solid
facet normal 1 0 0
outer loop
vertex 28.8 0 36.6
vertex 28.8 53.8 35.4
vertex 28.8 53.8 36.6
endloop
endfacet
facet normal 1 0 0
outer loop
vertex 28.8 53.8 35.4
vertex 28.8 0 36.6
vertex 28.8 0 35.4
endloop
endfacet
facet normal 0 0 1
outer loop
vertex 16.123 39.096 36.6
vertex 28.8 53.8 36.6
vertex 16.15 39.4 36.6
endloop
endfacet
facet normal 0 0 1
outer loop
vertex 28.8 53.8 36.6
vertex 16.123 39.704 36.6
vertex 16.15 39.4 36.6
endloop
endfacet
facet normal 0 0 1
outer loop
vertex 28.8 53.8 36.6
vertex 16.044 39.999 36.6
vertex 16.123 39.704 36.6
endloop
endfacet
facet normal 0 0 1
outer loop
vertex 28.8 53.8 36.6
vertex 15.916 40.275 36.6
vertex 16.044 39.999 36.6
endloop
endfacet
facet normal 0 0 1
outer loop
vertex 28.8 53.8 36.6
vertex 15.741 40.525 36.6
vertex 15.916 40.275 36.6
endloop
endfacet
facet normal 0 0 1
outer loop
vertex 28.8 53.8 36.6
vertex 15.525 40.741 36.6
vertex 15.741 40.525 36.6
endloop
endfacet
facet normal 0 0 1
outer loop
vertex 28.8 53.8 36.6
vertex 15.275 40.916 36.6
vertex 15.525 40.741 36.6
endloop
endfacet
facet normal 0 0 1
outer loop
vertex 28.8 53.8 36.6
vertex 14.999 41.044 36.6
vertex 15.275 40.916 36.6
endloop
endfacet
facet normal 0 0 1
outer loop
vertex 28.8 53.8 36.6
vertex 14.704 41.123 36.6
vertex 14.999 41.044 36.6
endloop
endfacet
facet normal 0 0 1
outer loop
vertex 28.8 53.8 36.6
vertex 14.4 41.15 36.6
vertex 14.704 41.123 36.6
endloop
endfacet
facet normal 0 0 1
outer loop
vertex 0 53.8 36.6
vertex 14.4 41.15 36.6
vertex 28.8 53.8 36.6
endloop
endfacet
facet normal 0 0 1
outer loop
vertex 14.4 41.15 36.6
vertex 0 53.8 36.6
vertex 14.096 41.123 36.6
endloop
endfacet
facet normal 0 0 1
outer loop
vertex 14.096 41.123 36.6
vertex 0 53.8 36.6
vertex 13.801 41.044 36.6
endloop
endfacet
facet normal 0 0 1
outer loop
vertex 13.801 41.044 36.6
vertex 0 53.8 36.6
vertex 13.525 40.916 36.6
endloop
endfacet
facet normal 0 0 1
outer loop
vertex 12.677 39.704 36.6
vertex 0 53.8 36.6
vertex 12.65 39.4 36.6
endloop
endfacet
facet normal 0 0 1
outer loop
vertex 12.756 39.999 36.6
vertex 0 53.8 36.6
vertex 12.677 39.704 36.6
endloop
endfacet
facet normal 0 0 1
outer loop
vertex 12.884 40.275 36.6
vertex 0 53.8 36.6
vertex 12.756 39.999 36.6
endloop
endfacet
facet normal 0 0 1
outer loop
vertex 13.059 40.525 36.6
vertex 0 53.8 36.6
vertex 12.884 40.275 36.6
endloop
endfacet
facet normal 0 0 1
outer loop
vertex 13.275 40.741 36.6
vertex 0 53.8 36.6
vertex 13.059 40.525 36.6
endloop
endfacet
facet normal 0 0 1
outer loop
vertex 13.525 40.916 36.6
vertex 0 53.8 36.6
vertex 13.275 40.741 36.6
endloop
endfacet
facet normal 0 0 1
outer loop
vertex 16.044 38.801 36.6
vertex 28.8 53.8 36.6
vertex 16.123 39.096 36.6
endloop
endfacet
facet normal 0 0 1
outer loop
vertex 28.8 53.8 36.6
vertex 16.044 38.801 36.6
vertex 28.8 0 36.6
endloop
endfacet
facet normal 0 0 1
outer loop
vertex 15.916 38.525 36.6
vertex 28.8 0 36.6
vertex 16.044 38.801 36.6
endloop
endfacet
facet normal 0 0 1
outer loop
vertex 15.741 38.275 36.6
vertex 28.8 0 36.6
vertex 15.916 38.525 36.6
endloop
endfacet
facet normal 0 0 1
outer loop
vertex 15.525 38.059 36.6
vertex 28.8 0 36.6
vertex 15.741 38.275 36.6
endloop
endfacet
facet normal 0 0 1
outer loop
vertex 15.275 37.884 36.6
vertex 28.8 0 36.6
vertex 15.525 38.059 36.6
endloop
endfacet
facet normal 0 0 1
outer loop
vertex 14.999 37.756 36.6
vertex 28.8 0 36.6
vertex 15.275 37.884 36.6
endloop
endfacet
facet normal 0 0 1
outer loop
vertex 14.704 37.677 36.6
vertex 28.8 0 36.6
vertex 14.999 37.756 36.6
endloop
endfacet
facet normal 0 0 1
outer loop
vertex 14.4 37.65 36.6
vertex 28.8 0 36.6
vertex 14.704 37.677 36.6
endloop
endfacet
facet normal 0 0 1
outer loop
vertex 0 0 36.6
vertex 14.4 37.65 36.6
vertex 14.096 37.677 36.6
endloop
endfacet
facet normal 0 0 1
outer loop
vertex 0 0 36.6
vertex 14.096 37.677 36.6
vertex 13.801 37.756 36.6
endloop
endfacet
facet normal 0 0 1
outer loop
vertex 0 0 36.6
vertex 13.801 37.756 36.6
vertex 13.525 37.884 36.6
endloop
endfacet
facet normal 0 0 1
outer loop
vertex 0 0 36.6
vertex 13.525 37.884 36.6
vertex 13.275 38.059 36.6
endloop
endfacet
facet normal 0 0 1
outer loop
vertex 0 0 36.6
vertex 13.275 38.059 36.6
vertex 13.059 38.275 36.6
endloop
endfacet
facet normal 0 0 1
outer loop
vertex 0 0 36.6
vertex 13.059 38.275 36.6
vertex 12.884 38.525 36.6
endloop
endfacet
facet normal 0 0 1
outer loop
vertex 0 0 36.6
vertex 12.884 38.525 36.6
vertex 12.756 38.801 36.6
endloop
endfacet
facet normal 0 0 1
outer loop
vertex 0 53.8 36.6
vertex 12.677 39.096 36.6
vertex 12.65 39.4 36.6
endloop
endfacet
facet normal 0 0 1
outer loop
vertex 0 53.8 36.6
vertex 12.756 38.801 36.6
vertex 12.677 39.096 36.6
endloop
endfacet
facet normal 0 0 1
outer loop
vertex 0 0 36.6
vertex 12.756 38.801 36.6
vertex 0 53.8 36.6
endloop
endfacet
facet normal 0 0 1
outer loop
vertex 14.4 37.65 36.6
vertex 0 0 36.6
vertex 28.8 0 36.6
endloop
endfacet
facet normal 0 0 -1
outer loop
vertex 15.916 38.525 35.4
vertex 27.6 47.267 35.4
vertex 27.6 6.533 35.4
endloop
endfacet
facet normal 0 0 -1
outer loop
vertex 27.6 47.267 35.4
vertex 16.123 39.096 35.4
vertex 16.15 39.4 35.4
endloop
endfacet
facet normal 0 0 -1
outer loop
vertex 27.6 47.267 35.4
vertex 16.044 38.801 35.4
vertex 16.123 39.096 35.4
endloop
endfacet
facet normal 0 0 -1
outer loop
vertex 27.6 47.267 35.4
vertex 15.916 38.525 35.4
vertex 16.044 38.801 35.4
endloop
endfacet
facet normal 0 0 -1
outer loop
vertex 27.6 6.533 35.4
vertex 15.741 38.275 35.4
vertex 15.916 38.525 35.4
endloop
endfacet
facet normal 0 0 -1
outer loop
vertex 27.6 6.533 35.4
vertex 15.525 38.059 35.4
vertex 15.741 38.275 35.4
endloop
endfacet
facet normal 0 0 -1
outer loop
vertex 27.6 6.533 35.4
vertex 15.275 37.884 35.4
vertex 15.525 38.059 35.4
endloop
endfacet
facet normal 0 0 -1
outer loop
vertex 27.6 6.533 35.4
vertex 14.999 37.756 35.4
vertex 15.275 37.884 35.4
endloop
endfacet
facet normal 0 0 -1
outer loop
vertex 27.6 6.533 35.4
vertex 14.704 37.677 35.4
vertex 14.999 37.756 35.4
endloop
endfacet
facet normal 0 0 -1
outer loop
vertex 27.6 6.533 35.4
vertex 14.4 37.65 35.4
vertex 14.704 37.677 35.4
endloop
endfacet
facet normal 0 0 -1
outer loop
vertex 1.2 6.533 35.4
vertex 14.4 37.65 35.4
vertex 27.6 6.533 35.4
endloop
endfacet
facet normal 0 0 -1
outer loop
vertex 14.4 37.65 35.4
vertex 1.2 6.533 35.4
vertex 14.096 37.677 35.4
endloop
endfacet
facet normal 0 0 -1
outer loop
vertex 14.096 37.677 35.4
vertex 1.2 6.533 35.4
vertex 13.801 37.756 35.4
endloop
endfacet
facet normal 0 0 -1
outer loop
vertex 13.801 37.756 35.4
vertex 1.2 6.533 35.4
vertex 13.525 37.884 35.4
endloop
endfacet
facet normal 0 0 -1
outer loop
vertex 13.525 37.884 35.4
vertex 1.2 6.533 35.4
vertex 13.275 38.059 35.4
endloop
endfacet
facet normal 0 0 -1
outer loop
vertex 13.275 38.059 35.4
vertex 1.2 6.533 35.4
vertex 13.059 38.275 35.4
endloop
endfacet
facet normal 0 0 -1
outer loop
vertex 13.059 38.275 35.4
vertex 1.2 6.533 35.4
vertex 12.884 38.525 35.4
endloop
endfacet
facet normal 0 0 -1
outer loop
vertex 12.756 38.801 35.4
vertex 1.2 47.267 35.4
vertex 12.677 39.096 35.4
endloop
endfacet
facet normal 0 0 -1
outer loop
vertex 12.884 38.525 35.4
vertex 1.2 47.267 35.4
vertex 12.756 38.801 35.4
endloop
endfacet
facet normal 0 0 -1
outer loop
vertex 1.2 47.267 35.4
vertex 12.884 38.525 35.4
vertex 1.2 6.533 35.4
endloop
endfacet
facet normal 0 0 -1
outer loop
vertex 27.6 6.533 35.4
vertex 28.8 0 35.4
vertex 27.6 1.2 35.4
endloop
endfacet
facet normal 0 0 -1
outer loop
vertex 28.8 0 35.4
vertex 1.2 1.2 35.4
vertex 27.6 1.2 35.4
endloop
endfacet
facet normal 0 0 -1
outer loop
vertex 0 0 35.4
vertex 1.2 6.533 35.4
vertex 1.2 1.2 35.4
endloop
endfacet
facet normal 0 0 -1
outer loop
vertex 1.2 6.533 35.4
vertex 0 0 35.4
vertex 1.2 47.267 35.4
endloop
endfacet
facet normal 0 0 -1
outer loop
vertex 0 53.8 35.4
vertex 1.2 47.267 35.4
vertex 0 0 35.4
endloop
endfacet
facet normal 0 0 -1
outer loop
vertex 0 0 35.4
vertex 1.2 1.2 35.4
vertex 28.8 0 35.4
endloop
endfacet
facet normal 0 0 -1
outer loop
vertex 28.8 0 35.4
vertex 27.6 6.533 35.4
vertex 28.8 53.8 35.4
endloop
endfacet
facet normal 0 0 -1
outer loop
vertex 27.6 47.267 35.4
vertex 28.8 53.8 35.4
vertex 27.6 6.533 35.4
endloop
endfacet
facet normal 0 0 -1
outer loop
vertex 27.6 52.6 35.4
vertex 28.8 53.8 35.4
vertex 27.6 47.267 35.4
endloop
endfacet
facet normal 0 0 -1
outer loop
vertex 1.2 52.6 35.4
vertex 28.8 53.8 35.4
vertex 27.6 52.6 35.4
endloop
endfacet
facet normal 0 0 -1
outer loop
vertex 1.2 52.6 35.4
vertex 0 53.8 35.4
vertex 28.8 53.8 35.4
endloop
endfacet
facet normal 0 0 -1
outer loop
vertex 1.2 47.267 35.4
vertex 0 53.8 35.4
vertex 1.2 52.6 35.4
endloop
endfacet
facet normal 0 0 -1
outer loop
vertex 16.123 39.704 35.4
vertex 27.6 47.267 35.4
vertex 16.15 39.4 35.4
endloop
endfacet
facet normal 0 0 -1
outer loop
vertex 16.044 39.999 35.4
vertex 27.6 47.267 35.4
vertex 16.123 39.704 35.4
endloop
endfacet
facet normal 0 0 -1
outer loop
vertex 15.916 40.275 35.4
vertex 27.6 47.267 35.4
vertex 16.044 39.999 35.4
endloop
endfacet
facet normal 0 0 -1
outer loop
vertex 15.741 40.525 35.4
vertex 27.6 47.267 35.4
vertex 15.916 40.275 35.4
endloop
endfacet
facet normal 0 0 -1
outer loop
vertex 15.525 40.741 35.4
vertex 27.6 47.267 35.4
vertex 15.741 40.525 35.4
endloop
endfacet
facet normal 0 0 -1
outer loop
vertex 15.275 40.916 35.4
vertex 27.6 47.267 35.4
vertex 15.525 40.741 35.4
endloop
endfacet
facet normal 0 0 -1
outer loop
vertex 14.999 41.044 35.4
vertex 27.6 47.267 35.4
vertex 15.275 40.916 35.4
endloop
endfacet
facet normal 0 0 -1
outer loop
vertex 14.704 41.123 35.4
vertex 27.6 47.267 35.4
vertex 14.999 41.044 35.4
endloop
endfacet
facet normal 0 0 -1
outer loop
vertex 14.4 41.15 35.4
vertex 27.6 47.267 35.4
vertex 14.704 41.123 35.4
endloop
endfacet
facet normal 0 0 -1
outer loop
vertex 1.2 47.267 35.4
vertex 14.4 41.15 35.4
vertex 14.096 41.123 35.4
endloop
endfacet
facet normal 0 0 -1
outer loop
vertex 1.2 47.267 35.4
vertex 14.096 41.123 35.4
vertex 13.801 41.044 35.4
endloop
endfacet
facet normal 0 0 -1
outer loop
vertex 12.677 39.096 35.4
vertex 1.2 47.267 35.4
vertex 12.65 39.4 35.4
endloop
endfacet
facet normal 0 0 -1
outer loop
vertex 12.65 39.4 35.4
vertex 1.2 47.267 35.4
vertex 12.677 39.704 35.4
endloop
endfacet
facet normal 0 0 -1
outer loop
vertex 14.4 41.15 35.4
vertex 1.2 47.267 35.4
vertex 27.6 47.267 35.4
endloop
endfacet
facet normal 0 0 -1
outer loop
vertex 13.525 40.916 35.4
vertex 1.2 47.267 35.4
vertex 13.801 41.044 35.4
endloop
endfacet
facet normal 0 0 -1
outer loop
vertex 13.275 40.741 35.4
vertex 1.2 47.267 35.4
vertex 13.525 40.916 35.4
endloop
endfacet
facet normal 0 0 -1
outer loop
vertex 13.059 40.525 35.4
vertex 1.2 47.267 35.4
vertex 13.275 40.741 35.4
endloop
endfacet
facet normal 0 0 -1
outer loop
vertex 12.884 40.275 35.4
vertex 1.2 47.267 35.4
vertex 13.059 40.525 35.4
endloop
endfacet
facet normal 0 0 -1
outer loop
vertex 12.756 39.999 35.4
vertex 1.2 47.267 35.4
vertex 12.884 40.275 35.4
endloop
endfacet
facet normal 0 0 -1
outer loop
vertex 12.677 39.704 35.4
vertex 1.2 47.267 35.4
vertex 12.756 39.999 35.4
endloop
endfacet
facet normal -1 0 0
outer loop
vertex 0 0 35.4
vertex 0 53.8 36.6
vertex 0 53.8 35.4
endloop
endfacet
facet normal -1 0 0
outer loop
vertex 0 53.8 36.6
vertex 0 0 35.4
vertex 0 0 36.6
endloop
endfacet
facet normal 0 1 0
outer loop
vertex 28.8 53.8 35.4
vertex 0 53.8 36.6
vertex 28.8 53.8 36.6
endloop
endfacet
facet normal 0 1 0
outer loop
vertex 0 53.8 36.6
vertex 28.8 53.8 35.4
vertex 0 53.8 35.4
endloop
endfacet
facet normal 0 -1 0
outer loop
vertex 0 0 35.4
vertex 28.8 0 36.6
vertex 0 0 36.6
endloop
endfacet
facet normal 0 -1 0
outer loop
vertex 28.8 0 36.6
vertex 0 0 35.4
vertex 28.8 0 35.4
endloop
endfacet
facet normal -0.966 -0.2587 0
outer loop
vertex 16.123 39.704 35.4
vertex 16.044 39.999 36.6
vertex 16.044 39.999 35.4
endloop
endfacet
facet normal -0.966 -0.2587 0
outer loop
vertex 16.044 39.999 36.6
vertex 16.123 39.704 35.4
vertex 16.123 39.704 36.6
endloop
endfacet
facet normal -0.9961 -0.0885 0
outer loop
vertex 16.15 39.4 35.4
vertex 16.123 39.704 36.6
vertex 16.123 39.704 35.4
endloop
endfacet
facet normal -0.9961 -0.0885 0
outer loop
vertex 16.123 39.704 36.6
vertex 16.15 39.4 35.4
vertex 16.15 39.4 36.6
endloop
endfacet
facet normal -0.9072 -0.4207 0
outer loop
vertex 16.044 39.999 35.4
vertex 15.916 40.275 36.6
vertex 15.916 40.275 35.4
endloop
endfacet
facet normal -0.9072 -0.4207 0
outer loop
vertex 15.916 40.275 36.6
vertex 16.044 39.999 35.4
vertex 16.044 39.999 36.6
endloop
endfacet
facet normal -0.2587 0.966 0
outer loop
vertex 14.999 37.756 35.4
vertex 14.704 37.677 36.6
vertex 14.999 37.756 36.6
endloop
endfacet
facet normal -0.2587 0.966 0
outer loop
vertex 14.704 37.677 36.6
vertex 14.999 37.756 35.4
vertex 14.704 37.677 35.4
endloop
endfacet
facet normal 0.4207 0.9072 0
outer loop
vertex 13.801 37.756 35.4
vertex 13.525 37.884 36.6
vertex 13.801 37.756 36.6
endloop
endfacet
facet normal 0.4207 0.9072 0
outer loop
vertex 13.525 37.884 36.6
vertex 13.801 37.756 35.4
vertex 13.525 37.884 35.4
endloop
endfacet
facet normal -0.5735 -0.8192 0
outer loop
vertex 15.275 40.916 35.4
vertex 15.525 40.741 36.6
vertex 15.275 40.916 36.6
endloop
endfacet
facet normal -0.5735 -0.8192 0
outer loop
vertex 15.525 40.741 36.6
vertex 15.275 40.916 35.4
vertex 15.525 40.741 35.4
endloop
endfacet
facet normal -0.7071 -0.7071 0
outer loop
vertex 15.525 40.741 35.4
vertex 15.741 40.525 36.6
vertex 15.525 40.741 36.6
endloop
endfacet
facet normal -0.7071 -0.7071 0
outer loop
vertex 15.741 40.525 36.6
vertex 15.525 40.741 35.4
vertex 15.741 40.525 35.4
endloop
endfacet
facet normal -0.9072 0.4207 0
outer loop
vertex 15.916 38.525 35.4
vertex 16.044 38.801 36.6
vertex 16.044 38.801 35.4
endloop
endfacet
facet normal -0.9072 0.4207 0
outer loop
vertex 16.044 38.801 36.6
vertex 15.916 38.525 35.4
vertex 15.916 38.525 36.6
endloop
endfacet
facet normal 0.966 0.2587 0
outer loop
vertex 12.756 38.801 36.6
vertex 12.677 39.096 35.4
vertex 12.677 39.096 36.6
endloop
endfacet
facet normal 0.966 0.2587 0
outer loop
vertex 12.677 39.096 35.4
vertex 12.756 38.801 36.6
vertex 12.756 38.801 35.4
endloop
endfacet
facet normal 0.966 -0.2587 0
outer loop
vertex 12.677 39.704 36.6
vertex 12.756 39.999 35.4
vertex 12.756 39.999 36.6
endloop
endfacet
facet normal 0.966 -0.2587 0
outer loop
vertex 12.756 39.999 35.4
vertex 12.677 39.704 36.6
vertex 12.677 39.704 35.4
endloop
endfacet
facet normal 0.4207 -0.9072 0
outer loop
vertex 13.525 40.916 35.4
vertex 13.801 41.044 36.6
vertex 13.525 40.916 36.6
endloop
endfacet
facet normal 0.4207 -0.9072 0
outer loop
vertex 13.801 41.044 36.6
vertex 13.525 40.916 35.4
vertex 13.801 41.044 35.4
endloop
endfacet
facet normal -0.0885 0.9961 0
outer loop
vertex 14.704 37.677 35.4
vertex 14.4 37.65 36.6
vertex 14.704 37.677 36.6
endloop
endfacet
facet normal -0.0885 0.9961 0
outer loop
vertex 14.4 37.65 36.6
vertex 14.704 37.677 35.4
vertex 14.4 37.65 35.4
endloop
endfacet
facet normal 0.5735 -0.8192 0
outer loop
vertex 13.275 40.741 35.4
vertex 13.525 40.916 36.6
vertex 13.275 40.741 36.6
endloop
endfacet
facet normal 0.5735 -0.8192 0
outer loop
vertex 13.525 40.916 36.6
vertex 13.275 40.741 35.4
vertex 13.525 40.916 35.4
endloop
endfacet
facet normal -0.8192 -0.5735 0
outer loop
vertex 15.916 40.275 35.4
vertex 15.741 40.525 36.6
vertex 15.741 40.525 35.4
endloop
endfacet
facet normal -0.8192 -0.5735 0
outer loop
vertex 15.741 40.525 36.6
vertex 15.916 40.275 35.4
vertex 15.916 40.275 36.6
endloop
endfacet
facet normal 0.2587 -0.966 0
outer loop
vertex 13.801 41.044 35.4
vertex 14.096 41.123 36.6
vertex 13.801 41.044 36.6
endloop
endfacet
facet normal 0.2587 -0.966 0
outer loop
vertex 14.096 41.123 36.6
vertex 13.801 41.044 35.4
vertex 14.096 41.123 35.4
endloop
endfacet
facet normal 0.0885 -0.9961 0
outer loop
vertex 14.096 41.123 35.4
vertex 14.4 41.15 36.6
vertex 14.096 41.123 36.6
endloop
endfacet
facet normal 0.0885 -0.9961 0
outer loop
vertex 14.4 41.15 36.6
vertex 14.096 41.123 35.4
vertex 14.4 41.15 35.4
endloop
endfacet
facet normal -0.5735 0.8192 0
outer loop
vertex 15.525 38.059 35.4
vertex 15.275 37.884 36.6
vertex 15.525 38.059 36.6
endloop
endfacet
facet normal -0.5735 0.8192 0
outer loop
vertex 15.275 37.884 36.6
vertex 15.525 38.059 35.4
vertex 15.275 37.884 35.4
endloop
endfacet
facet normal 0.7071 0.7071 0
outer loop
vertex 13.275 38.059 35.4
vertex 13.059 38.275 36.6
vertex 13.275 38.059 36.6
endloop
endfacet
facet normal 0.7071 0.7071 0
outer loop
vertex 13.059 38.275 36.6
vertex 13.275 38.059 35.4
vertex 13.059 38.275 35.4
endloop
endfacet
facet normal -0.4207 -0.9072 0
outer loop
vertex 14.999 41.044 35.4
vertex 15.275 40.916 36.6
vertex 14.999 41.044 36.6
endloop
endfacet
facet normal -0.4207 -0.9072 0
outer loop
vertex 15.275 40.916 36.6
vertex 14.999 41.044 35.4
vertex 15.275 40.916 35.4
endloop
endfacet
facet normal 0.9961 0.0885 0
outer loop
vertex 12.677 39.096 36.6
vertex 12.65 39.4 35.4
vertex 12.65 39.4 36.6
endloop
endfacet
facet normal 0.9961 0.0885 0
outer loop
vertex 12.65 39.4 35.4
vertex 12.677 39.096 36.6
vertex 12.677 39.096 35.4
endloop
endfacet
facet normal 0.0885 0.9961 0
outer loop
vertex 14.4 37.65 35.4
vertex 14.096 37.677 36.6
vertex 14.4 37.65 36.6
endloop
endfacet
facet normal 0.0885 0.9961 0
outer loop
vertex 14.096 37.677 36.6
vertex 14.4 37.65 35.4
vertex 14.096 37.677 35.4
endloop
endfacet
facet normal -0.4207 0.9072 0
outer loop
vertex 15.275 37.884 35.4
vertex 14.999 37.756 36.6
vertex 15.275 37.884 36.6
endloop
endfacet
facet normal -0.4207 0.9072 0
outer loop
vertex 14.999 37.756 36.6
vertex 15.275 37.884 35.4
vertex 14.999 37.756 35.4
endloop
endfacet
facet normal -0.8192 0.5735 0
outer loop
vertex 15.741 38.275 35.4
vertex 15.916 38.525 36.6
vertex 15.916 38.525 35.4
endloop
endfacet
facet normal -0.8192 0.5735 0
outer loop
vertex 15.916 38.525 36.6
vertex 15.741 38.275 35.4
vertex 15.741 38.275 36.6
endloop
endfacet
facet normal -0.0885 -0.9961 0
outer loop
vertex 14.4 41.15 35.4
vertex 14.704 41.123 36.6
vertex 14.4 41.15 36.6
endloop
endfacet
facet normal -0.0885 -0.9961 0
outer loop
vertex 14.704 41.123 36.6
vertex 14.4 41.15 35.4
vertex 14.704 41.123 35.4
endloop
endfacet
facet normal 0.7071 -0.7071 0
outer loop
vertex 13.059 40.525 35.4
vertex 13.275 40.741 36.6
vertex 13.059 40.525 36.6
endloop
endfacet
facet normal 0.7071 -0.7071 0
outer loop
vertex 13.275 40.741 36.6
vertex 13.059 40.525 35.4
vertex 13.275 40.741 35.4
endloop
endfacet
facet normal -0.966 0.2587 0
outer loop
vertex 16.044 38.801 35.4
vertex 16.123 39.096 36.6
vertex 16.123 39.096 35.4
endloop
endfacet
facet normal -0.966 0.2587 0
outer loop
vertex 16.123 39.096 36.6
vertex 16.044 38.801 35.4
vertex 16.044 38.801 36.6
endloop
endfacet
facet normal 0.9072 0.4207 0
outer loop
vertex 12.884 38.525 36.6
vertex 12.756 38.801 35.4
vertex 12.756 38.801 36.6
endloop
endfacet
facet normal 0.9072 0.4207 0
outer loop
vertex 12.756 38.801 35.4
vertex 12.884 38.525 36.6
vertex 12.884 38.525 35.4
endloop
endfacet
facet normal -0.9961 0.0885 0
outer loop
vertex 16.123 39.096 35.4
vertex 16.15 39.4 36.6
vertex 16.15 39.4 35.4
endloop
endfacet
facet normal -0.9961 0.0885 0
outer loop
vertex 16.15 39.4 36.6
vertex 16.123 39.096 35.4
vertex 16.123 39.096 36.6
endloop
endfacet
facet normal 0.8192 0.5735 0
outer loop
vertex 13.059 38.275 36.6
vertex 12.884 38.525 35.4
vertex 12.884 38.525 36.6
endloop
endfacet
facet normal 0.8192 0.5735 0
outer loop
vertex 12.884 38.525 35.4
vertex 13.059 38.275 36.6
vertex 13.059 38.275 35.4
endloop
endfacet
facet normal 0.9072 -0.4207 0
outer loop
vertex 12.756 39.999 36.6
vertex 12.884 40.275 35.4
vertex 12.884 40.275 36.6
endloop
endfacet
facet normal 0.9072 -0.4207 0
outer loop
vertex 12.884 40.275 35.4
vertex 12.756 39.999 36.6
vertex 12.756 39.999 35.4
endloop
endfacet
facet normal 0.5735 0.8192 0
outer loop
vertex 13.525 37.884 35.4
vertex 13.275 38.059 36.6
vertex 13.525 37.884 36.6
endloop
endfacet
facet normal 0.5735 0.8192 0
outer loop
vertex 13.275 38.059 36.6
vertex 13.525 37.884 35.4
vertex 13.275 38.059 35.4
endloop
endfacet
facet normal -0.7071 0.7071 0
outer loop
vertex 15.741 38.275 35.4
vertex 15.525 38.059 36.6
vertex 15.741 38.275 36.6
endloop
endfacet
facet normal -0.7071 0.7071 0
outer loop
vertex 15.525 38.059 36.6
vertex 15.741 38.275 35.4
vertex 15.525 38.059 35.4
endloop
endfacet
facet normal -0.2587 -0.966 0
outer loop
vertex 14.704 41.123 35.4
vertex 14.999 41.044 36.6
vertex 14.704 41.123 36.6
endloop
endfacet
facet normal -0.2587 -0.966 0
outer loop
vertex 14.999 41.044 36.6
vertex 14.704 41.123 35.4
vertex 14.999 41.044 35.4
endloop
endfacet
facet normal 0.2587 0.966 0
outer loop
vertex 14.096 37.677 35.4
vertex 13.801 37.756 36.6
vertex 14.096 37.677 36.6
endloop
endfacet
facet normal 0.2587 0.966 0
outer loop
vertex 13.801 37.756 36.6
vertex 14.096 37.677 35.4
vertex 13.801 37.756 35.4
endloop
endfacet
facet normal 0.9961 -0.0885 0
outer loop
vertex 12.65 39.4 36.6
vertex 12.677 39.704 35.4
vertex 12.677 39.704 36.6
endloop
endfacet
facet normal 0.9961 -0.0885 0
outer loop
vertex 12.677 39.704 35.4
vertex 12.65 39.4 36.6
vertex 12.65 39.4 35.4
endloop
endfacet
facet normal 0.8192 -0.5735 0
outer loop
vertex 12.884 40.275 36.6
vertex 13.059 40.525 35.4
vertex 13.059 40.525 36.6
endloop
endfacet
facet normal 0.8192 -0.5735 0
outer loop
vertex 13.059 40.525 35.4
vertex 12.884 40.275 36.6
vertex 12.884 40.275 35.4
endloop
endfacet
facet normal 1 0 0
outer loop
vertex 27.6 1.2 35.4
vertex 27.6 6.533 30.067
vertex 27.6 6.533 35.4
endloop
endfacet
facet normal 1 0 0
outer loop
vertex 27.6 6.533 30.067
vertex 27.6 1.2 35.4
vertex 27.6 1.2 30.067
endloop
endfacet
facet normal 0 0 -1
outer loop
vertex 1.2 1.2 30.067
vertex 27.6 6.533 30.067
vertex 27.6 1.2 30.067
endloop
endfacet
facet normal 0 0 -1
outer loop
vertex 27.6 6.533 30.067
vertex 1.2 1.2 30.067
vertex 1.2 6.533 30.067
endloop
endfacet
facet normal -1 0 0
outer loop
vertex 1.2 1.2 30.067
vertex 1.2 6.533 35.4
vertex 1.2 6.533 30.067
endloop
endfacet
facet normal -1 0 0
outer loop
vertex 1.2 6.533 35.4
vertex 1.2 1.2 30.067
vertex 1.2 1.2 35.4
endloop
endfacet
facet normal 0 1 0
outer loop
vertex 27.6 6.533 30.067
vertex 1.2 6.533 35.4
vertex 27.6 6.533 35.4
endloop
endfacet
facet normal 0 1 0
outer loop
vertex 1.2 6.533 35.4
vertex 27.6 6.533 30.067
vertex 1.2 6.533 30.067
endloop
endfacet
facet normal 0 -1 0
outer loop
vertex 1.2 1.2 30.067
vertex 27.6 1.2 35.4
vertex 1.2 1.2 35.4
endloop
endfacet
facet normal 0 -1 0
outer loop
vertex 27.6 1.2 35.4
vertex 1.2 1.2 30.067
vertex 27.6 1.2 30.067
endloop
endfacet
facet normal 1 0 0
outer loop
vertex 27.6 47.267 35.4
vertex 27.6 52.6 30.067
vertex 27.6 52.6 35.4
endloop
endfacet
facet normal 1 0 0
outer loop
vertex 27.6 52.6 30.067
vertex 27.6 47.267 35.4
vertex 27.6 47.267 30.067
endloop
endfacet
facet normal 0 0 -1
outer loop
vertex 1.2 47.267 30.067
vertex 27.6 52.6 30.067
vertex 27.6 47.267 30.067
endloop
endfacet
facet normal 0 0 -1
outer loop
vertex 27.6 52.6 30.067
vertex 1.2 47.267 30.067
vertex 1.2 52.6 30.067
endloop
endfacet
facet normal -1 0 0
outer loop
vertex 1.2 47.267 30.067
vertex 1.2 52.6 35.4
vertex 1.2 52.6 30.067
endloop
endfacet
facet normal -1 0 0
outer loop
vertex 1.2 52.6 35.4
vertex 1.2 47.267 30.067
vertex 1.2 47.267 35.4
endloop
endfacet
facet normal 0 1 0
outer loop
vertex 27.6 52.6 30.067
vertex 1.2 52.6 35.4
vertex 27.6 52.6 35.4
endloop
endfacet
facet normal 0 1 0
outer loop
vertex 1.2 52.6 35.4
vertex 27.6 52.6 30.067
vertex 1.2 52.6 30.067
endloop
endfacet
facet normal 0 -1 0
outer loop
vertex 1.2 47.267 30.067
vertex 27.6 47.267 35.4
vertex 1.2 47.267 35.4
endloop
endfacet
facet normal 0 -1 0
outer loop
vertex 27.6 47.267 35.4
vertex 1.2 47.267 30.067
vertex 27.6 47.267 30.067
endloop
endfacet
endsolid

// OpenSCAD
//Durchmesser Hohlbuchse
d=7.7;
//Breite Schalter
w=12.8;
//Höhe Schalter
h=19.4;
//Durchmesser Kabel
dk=3.5;
//Thickness Wände
t=1.2;
//Abstand zu den Seiten
a=16;
//Tiefe Schalter und Stecker
ts=25;
$fn=36;

module aussparung_schalter()
{
    color("gray")
    cube([w,t+ts,h]);
}

module wand_schalterseite()
{
cube([w+a,t,h+a]);    
}

module wand_vorne()
{
    difference()
    {
//vorne
wand_schalterseite();
translate([a/2,0,a/2])
aussparung_schalter();
}
}

module wandobenunten()
{
cube([w+a,w+a+ts,t]);
}

module wand_hinten()
{
    //hinten
translate([0,w+a+ts-t,0])
wand_schalterseite();
}

module wand_unten()
{
    difference()
    {
wandobenunten();
color("gray")
translate([(w+a)/2,(w+a)/2+ts,0])
cylinder(h=t+ts, d1=d, d2=d);

    }}

module wand_oben()
{
    difference()
    {
translate([0,0,h+a])
wandobenunten();

color("gray")
translate([(w+a)/2,(w+a)/2+ts,h+a])
cylinder(h=t, d1=dk, d2=dk);
}
}


module connector()
{
    translate([t,0,0])
cube([w+a-t*2,a/3,a/3]);
}

module connectorvornenunten()
{
translate([0,t,t])
connector();
}

module connectorhintenunten()
{
translate([0,w+a+ts-a/3-t,t])
connector();
}

module connectorvorneoben()
{
translate([0,t,h+a-a/3])
connector();
}

module connectorhintenoben()
{
translate([0,w+a+ts-a/3-t,h+a-a/3])
connector();
}

module wandseite()
{
translate([0,t,t])
color("blue")
cube([t,w+a+ts-t*2,h+a-t]);
}

module wandlinks()
{
wandseite();
}

module wandrechts()
{
translate([w+a-t,0,0])
wandseite();
}

wand_oben();
connectorvorneoben();
connectorhintenoben();

//wand_unten();
//connectorvornenunten();
//connectorhintenunten();

//wand_vorne();
//wand_hinten();
//wandlinks();
//wandrechts();
